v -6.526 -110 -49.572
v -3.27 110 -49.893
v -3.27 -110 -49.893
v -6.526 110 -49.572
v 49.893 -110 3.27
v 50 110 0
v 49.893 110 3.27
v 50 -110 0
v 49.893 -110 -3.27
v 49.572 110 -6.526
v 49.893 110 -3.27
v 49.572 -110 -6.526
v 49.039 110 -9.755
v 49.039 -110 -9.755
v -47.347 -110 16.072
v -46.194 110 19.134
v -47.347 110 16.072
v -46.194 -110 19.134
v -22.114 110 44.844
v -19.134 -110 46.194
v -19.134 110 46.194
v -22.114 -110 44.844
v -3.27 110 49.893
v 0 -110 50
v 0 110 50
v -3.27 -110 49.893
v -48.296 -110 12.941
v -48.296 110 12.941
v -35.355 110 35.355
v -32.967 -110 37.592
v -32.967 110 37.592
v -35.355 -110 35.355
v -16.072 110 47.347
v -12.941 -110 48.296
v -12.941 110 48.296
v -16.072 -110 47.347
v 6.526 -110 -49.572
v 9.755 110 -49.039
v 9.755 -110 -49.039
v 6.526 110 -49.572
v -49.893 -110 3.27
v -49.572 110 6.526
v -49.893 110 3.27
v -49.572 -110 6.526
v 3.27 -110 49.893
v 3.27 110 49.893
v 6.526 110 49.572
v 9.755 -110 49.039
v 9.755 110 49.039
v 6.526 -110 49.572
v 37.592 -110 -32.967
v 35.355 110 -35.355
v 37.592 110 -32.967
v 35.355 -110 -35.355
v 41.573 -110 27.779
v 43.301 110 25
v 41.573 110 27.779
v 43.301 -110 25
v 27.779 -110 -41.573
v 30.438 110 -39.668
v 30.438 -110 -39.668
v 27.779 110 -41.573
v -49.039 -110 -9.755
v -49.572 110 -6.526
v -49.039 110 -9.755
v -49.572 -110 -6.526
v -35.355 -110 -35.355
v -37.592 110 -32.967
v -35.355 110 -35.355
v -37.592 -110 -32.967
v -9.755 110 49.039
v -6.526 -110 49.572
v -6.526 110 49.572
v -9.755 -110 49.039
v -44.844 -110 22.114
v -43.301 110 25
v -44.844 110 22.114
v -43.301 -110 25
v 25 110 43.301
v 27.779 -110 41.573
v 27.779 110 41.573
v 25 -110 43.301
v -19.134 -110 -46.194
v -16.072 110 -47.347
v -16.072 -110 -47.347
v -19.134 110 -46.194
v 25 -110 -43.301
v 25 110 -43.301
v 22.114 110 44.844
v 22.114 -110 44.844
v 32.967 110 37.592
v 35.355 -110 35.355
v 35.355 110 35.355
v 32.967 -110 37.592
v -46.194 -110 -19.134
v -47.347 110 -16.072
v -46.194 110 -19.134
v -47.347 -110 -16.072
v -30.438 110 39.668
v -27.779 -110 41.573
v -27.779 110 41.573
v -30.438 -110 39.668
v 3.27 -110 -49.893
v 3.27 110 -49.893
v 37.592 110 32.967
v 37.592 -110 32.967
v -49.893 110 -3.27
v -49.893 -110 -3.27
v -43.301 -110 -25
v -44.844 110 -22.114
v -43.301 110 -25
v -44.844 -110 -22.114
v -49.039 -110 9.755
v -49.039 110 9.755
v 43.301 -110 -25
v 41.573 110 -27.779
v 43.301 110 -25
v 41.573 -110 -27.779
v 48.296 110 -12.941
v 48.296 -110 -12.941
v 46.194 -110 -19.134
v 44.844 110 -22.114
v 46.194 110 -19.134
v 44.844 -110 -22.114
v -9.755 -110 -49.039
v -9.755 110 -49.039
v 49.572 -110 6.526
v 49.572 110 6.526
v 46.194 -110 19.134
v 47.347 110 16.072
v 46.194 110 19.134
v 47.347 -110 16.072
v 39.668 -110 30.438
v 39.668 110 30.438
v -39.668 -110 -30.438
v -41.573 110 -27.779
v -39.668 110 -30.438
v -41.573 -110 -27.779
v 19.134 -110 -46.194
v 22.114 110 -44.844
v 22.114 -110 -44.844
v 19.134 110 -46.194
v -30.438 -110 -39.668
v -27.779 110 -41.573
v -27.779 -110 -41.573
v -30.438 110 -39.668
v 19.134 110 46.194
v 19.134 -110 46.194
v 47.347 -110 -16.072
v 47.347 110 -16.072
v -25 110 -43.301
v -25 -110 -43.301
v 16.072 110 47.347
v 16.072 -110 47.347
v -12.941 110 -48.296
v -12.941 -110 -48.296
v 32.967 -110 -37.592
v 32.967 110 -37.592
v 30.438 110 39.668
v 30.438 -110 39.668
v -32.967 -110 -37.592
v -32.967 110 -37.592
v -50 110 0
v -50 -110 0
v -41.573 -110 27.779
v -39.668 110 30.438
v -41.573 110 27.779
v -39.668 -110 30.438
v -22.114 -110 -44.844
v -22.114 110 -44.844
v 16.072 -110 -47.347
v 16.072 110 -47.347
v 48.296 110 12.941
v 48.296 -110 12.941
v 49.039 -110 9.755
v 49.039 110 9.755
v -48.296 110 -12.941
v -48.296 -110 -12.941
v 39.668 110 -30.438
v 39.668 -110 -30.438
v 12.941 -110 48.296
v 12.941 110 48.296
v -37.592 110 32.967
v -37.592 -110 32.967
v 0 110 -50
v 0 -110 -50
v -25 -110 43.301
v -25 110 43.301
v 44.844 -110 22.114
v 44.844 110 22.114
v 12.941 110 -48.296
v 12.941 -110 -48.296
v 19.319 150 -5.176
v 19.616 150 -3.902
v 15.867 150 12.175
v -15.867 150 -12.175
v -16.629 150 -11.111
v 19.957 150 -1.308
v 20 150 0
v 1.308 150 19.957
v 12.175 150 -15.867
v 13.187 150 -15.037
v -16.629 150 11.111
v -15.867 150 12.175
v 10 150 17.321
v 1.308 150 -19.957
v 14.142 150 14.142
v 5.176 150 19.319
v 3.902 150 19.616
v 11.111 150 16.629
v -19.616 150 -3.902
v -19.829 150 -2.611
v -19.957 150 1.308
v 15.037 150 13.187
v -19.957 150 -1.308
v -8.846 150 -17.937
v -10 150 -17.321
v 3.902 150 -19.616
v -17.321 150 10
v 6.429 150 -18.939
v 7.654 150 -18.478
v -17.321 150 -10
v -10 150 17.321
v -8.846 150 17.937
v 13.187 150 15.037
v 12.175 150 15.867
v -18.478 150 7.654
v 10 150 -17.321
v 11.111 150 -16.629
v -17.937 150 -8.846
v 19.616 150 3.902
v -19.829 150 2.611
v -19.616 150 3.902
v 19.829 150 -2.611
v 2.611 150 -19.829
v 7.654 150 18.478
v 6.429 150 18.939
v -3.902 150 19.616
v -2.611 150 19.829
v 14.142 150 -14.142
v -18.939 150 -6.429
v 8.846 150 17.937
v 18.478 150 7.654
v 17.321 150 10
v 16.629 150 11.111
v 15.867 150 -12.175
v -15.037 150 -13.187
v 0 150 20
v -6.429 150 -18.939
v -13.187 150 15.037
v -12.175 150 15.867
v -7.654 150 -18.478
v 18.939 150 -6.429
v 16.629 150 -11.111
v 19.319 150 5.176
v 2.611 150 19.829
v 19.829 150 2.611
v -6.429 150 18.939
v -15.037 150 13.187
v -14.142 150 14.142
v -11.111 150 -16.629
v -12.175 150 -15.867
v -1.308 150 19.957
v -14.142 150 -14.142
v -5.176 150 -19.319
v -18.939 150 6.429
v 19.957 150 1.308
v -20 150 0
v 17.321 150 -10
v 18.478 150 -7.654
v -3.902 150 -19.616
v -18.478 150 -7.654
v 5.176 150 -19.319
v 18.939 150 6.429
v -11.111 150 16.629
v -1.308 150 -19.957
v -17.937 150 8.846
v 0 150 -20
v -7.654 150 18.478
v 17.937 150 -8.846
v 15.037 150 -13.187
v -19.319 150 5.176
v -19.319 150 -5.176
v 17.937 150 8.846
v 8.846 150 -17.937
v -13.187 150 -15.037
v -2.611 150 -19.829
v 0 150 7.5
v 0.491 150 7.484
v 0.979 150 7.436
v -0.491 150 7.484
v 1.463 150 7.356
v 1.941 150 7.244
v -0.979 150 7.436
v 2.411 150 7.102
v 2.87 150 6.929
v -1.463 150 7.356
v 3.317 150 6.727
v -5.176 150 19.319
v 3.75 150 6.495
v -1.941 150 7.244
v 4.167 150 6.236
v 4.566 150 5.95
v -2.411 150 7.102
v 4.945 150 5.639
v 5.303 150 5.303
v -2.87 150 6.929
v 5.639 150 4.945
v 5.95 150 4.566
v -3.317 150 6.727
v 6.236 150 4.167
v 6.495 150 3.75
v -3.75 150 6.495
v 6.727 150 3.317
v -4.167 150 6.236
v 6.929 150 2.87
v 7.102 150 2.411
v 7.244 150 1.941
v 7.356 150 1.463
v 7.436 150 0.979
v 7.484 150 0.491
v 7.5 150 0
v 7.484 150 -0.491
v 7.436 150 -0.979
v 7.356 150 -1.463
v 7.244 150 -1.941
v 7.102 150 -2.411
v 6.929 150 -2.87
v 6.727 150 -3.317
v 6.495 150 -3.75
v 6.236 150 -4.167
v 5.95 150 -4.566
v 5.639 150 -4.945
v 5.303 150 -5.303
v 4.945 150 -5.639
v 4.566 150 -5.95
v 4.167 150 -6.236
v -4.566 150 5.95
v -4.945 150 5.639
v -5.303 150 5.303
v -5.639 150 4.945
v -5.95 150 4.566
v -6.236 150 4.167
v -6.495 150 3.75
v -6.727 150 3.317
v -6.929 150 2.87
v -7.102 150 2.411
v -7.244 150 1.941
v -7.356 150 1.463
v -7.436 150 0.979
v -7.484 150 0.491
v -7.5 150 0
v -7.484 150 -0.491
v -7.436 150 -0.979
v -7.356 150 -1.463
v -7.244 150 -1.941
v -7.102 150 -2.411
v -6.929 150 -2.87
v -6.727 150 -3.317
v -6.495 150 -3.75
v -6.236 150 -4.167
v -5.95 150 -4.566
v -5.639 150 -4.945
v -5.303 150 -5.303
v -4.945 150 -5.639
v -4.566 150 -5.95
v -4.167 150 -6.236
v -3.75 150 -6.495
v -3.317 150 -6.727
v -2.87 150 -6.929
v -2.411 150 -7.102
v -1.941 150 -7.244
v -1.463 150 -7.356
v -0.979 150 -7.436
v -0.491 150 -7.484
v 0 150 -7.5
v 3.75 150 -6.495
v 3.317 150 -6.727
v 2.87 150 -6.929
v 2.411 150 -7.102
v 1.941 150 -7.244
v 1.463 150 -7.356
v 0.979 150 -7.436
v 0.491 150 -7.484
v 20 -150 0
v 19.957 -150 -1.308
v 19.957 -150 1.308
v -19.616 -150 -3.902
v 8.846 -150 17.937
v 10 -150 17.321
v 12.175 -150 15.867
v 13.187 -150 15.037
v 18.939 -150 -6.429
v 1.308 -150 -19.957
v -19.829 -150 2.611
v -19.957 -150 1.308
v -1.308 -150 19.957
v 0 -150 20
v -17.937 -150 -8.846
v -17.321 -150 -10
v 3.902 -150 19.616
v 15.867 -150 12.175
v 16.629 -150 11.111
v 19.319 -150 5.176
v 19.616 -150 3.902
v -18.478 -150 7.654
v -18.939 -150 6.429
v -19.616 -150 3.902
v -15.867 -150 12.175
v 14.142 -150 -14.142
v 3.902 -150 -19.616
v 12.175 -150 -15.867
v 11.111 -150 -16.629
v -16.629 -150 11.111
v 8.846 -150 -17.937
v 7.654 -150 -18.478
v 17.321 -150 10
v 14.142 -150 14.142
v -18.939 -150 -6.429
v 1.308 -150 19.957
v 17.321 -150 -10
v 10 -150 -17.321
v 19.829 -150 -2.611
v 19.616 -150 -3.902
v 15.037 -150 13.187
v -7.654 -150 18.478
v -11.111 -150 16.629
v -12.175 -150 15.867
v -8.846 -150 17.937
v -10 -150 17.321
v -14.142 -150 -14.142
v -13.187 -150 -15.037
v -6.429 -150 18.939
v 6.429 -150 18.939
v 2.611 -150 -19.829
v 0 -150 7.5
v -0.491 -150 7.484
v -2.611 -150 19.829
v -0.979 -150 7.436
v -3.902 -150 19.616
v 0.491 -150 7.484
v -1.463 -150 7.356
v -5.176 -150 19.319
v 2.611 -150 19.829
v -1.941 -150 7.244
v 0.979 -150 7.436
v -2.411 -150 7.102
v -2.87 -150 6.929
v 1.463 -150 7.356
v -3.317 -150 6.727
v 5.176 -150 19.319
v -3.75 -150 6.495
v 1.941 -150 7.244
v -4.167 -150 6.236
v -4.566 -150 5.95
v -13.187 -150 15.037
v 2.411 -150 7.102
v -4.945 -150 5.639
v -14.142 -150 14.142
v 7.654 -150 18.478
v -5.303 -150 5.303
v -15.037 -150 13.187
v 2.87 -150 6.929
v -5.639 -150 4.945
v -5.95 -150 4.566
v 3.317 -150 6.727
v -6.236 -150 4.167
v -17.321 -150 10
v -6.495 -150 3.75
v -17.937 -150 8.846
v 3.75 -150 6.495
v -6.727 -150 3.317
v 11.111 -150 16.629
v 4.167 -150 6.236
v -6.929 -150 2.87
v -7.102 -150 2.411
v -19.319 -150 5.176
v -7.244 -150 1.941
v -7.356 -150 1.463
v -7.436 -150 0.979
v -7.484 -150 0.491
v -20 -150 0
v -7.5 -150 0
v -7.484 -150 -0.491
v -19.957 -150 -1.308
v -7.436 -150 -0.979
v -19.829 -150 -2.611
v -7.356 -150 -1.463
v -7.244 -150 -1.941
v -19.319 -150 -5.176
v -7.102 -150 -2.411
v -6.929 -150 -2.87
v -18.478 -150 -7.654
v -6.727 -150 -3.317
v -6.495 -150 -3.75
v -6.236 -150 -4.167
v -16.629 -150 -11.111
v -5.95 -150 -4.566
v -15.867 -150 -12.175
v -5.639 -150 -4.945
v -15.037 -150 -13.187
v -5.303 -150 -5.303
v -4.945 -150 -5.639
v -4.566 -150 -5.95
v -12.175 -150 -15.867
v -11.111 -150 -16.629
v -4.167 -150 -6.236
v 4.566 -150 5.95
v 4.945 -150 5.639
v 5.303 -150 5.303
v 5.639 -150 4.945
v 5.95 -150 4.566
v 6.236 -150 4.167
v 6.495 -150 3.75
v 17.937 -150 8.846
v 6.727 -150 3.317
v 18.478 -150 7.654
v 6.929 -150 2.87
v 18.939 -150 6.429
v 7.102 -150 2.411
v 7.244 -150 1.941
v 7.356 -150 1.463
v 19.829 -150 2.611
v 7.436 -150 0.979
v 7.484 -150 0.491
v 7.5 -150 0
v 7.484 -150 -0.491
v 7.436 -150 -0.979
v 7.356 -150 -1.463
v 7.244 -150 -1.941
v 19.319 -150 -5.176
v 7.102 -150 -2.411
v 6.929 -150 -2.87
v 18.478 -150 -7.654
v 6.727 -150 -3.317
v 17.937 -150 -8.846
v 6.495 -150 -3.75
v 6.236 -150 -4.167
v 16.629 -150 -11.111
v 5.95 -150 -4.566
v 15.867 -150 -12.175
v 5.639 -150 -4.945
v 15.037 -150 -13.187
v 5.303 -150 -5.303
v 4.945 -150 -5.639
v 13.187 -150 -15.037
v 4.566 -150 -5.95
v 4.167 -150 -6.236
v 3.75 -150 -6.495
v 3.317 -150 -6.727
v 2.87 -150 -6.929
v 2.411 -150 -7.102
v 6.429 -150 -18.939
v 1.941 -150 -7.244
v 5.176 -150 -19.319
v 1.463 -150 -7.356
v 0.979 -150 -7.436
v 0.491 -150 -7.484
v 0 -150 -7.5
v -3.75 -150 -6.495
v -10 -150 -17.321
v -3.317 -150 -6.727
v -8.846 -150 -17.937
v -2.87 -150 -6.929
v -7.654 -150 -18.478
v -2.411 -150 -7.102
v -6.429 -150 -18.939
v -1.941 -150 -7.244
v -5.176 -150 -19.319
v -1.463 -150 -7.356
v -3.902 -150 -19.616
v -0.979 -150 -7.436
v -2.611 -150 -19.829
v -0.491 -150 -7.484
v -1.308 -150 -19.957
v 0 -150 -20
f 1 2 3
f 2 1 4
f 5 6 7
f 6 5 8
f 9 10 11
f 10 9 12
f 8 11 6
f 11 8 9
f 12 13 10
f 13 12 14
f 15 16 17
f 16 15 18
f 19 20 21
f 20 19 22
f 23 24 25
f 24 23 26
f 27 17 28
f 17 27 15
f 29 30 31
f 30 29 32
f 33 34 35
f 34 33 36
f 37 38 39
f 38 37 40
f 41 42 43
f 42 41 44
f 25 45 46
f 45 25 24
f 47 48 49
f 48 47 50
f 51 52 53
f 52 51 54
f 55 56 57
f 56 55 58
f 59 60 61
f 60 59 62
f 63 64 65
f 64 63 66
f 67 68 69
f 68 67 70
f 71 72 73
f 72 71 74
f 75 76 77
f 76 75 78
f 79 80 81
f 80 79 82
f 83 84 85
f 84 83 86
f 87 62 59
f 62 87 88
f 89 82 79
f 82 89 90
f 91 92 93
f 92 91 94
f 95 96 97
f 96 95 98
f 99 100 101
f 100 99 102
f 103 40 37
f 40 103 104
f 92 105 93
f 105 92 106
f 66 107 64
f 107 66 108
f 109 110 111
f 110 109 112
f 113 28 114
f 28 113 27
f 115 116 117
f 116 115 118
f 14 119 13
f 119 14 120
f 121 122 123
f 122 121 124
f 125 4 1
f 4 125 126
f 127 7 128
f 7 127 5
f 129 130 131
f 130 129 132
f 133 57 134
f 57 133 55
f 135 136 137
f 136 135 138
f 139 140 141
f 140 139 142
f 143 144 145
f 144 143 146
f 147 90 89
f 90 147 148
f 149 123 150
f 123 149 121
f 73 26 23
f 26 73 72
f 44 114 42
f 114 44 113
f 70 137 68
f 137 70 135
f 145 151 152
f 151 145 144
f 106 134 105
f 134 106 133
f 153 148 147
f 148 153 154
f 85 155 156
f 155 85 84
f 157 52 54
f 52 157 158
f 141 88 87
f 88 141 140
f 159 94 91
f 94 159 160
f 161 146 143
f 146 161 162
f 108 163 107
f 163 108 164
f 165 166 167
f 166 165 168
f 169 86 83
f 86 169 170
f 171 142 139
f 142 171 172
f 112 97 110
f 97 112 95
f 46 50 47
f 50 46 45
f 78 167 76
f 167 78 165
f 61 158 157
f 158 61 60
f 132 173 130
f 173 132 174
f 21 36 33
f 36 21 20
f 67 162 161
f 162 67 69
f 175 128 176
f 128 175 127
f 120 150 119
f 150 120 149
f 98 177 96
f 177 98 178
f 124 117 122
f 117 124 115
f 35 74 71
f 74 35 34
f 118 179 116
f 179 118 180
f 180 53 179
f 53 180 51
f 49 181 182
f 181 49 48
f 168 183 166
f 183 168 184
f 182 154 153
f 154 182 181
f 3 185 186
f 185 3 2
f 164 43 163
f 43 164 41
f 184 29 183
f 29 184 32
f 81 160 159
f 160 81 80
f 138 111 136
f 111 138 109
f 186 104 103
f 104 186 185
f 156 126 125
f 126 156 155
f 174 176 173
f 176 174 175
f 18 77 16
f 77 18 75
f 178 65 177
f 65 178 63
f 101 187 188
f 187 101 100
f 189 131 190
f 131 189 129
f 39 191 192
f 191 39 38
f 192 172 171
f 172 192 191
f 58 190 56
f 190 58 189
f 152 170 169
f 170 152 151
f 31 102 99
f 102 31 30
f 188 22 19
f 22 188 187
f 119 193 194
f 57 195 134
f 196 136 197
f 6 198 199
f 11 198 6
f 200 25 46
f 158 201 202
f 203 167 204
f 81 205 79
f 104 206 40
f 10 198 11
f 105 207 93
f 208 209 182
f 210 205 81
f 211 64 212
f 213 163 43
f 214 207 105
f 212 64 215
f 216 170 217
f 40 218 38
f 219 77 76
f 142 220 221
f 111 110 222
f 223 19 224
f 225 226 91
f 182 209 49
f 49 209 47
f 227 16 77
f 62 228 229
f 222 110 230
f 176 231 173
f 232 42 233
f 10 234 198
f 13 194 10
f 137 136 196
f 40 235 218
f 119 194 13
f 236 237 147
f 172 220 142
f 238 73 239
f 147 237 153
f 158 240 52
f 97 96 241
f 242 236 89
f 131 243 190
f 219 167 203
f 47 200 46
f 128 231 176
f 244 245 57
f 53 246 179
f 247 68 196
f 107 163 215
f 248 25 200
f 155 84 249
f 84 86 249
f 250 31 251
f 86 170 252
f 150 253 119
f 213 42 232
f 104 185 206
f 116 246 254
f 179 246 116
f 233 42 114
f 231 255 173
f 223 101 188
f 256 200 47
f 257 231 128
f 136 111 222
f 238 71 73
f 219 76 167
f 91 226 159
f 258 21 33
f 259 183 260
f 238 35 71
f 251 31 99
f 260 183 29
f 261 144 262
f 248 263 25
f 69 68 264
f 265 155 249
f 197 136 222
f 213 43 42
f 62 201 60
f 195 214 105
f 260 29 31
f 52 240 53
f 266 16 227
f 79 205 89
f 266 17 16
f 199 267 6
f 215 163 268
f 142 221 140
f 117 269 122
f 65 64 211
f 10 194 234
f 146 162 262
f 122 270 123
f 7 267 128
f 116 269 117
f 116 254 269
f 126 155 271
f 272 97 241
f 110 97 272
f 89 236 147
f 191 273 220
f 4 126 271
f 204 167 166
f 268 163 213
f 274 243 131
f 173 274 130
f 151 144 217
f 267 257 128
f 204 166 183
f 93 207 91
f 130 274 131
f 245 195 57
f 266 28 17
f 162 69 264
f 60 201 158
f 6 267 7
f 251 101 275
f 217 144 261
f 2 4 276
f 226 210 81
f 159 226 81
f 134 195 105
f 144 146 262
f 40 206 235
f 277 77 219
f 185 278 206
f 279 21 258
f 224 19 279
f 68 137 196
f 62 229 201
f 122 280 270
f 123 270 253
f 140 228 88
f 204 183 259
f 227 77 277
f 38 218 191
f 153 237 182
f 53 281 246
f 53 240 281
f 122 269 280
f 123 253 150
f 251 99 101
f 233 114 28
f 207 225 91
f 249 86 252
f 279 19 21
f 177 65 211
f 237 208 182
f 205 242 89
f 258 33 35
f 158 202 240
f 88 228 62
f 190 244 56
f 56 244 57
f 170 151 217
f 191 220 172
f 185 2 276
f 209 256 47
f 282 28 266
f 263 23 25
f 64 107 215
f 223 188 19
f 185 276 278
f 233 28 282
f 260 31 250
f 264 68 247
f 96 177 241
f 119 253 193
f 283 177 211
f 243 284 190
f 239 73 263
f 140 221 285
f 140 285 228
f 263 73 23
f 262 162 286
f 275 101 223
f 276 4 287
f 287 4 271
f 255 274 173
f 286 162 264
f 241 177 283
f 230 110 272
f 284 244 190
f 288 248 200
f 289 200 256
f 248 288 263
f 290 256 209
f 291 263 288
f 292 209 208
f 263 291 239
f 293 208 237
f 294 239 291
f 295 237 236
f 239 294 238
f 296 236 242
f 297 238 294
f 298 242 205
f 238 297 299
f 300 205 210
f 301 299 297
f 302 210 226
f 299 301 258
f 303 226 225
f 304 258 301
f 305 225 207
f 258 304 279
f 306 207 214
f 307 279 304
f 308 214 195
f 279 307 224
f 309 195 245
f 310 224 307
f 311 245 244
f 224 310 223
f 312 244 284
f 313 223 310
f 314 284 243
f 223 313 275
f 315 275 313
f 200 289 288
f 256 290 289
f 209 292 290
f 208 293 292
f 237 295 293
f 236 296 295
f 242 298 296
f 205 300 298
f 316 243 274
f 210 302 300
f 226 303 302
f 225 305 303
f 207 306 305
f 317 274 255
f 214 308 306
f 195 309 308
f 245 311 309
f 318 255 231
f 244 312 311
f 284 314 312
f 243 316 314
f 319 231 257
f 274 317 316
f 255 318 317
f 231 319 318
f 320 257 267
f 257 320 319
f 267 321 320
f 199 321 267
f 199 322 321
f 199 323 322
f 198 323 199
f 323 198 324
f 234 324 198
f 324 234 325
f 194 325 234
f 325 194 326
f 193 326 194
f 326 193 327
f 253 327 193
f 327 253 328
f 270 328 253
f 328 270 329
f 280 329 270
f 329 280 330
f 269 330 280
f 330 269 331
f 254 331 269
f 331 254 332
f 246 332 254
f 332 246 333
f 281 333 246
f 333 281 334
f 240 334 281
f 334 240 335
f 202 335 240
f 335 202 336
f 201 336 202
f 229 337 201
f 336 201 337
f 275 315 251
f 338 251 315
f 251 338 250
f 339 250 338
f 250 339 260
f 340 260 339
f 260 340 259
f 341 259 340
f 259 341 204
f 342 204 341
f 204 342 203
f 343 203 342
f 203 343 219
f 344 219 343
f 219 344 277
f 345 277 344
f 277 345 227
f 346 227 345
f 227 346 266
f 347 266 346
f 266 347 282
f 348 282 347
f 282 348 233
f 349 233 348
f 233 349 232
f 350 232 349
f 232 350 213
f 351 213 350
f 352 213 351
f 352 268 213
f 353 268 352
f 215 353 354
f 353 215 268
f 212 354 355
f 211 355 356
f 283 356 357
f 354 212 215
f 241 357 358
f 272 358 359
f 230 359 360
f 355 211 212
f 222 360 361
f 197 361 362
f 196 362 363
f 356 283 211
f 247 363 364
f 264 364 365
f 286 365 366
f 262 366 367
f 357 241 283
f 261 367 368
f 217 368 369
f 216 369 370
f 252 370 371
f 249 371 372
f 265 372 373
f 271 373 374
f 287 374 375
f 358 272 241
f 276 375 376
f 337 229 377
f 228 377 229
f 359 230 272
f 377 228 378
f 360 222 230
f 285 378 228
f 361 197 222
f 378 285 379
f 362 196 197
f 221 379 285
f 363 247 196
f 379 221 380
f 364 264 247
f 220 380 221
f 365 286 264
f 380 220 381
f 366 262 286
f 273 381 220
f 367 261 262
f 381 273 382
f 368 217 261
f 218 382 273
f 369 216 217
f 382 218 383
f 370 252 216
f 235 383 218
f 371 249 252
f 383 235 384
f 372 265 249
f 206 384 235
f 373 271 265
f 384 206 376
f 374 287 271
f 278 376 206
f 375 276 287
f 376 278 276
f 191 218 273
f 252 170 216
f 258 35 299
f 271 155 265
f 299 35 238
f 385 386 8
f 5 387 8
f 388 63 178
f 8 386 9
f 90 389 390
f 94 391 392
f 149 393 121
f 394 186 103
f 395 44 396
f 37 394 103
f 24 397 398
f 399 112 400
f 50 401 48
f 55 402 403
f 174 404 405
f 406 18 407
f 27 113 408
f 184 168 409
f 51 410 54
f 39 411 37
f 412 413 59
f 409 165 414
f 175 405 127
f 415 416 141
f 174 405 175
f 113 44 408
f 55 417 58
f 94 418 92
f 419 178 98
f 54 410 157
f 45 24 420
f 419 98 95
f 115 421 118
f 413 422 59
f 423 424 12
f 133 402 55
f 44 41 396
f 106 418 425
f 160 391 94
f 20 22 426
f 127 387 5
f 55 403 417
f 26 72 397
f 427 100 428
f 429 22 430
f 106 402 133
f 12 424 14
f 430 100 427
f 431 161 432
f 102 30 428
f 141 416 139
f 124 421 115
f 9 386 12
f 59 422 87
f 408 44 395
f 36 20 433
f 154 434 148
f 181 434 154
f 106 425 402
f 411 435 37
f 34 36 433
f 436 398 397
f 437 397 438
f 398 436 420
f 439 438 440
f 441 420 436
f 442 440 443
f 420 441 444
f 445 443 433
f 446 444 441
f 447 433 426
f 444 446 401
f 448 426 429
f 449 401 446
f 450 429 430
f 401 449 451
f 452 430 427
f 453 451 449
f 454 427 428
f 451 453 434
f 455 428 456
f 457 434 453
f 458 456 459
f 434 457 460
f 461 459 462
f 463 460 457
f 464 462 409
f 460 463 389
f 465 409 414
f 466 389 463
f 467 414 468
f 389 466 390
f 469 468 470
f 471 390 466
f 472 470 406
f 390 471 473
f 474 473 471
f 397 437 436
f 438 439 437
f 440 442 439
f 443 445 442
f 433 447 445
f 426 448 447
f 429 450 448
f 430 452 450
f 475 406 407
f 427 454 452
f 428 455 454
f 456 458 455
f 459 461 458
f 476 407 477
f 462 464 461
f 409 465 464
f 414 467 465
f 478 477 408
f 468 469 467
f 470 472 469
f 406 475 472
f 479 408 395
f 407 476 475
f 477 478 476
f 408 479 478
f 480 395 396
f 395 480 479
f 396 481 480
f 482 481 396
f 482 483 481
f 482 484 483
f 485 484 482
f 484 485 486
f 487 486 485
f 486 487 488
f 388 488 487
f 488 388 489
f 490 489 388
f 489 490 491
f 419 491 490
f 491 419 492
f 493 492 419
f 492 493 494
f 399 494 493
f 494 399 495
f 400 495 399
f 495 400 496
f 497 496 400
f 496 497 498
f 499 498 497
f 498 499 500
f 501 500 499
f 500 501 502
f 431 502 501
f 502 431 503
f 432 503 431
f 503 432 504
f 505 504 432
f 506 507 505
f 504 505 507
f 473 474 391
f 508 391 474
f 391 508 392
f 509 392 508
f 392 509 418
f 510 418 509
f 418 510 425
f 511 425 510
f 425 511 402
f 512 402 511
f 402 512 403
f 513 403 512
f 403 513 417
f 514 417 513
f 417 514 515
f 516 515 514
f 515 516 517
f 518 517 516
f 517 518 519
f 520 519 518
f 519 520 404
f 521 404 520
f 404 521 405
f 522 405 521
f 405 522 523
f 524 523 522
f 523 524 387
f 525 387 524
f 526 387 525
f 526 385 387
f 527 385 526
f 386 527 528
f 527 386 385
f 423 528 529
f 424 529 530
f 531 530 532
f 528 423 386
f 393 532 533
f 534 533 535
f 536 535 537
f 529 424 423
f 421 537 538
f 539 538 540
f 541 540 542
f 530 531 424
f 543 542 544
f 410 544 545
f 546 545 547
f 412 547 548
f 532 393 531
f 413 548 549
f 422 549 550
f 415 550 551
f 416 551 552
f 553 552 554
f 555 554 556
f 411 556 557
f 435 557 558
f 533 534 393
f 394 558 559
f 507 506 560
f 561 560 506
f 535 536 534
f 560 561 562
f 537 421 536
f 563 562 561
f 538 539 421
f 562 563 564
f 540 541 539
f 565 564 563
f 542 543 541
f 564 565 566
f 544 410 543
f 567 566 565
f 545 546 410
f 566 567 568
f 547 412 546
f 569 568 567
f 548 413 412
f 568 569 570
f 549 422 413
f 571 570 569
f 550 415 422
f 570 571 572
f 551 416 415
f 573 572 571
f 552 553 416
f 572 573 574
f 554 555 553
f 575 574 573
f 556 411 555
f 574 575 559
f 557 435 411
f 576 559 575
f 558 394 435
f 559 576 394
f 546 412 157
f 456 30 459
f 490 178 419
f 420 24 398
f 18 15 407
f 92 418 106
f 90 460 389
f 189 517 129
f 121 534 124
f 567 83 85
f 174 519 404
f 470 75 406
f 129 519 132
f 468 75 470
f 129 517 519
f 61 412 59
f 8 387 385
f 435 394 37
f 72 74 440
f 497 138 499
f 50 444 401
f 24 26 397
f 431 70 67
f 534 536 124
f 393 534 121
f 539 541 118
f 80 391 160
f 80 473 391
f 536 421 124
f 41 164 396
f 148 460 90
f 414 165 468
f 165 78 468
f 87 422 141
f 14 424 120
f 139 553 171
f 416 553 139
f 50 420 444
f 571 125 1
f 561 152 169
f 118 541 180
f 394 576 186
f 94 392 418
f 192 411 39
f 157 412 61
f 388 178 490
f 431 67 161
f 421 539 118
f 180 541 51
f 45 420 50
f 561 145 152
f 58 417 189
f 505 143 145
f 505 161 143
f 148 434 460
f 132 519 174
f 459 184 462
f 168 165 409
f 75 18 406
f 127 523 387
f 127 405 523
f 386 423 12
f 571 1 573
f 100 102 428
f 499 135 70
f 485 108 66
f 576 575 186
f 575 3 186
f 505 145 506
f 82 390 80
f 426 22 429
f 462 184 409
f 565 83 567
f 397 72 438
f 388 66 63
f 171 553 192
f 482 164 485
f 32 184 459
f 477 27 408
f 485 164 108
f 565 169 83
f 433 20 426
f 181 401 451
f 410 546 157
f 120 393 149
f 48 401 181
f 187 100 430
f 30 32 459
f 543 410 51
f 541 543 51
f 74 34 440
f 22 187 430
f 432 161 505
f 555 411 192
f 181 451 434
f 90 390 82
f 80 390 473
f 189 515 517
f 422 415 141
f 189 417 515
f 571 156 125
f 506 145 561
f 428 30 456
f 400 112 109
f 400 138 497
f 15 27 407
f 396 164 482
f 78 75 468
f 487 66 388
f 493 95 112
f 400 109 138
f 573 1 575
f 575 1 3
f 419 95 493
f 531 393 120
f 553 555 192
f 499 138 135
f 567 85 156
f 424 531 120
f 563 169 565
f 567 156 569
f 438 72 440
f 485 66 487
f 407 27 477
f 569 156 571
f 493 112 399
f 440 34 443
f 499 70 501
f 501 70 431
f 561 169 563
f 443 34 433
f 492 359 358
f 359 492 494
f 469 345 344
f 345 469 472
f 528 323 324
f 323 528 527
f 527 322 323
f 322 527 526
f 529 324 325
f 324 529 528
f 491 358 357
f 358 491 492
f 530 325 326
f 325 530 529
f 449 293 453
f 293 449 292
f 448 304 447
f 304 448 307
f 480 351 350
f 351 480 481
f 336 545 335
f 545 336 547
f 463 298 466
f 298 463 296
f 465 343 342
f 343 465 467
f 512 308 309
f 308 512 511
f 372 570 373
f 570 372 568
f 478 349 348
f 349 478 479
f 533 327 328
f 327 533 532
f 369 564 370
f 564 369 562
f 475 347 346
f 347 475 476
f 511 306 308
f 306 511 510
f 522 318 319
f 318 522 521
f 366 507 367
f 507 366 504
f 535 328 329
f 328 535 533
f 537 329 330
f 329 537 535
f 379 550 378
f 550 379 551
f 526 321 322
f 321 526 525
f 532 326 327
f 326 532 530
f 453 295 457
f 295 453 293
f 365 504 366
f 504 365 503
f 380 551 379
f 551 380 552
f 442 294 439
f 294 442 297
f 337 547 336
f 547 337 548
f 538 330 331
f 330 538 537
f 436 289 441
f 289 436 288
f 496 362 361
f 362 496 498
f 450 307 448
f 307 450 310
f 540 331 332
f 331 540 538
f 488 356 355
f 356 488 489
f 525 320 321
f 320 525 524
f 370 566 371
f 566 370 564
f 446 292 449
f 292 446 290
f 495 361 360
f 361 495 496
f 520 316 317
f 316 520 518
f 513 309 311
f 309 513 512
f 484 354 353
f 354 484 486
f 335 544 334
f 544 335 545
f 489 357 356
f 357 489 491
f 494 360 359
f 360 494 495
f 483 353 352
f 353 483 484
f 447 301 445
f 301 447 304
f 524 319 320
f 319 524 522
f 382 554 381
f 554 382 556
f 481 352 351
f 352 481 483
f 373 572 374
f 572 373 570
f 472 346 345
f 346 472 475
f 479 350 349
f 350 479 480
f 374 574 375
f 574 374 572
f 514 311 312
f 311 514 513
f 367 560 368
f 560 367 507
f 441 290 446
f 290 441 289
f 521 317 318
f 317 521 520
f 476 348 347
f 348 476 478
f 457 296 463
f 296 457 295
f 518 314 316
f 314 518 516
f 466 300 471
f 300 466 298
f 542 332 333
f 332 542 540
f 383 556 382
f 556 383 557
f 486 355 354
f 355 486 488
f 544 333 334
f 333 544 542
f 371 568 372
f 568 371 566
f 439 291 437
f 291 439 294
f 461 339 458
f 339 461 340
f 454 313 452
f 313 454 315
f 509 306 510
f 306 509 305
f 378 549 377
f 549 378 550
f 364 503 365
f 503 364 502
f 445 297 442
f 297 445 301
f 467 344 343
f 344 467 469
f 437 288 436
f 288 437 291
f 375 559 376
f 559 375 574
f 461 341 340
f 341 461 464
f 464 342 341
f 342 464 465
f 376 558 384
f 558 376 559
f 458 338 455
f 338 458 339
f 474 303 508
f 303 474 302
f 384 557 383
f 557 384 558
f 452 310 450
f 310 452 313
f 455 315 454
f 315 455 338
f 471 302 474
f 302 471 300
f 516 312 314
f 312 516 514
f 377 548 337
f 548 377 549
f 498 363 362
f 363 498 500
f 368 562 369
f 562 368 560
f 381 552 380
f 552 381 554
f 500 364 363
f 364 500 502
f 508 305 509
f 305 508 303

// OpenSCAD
// =====================================================================
// parent_fender.scad — 親機 浮子 (市販の紡錘形フロート、中心に紐通しの空洞) 仮モデル (購入品)
//
// 配置検討・アセンブリ表示用。印刷対象ではない。
// **寸法はすべて仮値** (2026-09-04/05 人間回答: 「現物があるが寸法は後で測る」
//   「完全な円筒ではない (挟めない)」「中に空洞があるので紐を通して固定」)。
// 実測後に parent_fender.md と本ファイル、parent_float_yoke.scad の同名変数を同時に更新する (二重定義)。
//
// 座標系: 浮子の軸 = Y、原点 = 胴の中心。両端は円錐で先細り、中心に貫通穴 (紐通し)。
// =====================================================================

/* [外形 (仮値・要実測)] */
fender_d   = 100;   // 胴の最大外径
fender_len = 300;   // 全長 (端面から端面)
taper_len  = 40;    // 先細り部の長さ (片側)
end_d      = 40;    // 端面の径
bore_d     = 15;    // 中心空洞 (紐通し) の径

$fn = 96;

cyl_len = fender_len - 2*taper_len;
vol_l = (PI*pow(fender_d/2,2)*cyl_len
         + 2 * PI*taper_len/3 * (pow(fender_d/2,2) + fender_d/2*end_d/2 + pow(end_d/2,2))
         - PI*pow(bore_d/2,2)*fender_len) / 1e6;
assert(cyl_len > 0, "先細り部が全長より長い");
assert(end_d > bore_d + 6, "端面が空洞に対して薄い");
echo(str("parent_fender: d=", fender_d, " len=", fender_len, " taper=", taper_len, " end_d=", end_d,
         " bore=", bore_d, " displacement=", vol_l, " L/pc (provisional)"));

rotate([-90, 0, 0]) difference() {
    union() {
        translate([0, 0, -cyl_len/2]) cylinder(d = fender_d, h = cyl_len);
        translate([0, 0,  cyl_len/2]) cylinder(d1 = fender_d, d2 = end_d, h = taper_len);
        translate([0, 0, -cyl_len/2]) mirror([0, 0, 1]) cylinder(d1 = fender_d, d2 = end_d, h = taper_len);
    }
    cylinder(d = bore_d, h = fender_len + 2, center = true);
}
